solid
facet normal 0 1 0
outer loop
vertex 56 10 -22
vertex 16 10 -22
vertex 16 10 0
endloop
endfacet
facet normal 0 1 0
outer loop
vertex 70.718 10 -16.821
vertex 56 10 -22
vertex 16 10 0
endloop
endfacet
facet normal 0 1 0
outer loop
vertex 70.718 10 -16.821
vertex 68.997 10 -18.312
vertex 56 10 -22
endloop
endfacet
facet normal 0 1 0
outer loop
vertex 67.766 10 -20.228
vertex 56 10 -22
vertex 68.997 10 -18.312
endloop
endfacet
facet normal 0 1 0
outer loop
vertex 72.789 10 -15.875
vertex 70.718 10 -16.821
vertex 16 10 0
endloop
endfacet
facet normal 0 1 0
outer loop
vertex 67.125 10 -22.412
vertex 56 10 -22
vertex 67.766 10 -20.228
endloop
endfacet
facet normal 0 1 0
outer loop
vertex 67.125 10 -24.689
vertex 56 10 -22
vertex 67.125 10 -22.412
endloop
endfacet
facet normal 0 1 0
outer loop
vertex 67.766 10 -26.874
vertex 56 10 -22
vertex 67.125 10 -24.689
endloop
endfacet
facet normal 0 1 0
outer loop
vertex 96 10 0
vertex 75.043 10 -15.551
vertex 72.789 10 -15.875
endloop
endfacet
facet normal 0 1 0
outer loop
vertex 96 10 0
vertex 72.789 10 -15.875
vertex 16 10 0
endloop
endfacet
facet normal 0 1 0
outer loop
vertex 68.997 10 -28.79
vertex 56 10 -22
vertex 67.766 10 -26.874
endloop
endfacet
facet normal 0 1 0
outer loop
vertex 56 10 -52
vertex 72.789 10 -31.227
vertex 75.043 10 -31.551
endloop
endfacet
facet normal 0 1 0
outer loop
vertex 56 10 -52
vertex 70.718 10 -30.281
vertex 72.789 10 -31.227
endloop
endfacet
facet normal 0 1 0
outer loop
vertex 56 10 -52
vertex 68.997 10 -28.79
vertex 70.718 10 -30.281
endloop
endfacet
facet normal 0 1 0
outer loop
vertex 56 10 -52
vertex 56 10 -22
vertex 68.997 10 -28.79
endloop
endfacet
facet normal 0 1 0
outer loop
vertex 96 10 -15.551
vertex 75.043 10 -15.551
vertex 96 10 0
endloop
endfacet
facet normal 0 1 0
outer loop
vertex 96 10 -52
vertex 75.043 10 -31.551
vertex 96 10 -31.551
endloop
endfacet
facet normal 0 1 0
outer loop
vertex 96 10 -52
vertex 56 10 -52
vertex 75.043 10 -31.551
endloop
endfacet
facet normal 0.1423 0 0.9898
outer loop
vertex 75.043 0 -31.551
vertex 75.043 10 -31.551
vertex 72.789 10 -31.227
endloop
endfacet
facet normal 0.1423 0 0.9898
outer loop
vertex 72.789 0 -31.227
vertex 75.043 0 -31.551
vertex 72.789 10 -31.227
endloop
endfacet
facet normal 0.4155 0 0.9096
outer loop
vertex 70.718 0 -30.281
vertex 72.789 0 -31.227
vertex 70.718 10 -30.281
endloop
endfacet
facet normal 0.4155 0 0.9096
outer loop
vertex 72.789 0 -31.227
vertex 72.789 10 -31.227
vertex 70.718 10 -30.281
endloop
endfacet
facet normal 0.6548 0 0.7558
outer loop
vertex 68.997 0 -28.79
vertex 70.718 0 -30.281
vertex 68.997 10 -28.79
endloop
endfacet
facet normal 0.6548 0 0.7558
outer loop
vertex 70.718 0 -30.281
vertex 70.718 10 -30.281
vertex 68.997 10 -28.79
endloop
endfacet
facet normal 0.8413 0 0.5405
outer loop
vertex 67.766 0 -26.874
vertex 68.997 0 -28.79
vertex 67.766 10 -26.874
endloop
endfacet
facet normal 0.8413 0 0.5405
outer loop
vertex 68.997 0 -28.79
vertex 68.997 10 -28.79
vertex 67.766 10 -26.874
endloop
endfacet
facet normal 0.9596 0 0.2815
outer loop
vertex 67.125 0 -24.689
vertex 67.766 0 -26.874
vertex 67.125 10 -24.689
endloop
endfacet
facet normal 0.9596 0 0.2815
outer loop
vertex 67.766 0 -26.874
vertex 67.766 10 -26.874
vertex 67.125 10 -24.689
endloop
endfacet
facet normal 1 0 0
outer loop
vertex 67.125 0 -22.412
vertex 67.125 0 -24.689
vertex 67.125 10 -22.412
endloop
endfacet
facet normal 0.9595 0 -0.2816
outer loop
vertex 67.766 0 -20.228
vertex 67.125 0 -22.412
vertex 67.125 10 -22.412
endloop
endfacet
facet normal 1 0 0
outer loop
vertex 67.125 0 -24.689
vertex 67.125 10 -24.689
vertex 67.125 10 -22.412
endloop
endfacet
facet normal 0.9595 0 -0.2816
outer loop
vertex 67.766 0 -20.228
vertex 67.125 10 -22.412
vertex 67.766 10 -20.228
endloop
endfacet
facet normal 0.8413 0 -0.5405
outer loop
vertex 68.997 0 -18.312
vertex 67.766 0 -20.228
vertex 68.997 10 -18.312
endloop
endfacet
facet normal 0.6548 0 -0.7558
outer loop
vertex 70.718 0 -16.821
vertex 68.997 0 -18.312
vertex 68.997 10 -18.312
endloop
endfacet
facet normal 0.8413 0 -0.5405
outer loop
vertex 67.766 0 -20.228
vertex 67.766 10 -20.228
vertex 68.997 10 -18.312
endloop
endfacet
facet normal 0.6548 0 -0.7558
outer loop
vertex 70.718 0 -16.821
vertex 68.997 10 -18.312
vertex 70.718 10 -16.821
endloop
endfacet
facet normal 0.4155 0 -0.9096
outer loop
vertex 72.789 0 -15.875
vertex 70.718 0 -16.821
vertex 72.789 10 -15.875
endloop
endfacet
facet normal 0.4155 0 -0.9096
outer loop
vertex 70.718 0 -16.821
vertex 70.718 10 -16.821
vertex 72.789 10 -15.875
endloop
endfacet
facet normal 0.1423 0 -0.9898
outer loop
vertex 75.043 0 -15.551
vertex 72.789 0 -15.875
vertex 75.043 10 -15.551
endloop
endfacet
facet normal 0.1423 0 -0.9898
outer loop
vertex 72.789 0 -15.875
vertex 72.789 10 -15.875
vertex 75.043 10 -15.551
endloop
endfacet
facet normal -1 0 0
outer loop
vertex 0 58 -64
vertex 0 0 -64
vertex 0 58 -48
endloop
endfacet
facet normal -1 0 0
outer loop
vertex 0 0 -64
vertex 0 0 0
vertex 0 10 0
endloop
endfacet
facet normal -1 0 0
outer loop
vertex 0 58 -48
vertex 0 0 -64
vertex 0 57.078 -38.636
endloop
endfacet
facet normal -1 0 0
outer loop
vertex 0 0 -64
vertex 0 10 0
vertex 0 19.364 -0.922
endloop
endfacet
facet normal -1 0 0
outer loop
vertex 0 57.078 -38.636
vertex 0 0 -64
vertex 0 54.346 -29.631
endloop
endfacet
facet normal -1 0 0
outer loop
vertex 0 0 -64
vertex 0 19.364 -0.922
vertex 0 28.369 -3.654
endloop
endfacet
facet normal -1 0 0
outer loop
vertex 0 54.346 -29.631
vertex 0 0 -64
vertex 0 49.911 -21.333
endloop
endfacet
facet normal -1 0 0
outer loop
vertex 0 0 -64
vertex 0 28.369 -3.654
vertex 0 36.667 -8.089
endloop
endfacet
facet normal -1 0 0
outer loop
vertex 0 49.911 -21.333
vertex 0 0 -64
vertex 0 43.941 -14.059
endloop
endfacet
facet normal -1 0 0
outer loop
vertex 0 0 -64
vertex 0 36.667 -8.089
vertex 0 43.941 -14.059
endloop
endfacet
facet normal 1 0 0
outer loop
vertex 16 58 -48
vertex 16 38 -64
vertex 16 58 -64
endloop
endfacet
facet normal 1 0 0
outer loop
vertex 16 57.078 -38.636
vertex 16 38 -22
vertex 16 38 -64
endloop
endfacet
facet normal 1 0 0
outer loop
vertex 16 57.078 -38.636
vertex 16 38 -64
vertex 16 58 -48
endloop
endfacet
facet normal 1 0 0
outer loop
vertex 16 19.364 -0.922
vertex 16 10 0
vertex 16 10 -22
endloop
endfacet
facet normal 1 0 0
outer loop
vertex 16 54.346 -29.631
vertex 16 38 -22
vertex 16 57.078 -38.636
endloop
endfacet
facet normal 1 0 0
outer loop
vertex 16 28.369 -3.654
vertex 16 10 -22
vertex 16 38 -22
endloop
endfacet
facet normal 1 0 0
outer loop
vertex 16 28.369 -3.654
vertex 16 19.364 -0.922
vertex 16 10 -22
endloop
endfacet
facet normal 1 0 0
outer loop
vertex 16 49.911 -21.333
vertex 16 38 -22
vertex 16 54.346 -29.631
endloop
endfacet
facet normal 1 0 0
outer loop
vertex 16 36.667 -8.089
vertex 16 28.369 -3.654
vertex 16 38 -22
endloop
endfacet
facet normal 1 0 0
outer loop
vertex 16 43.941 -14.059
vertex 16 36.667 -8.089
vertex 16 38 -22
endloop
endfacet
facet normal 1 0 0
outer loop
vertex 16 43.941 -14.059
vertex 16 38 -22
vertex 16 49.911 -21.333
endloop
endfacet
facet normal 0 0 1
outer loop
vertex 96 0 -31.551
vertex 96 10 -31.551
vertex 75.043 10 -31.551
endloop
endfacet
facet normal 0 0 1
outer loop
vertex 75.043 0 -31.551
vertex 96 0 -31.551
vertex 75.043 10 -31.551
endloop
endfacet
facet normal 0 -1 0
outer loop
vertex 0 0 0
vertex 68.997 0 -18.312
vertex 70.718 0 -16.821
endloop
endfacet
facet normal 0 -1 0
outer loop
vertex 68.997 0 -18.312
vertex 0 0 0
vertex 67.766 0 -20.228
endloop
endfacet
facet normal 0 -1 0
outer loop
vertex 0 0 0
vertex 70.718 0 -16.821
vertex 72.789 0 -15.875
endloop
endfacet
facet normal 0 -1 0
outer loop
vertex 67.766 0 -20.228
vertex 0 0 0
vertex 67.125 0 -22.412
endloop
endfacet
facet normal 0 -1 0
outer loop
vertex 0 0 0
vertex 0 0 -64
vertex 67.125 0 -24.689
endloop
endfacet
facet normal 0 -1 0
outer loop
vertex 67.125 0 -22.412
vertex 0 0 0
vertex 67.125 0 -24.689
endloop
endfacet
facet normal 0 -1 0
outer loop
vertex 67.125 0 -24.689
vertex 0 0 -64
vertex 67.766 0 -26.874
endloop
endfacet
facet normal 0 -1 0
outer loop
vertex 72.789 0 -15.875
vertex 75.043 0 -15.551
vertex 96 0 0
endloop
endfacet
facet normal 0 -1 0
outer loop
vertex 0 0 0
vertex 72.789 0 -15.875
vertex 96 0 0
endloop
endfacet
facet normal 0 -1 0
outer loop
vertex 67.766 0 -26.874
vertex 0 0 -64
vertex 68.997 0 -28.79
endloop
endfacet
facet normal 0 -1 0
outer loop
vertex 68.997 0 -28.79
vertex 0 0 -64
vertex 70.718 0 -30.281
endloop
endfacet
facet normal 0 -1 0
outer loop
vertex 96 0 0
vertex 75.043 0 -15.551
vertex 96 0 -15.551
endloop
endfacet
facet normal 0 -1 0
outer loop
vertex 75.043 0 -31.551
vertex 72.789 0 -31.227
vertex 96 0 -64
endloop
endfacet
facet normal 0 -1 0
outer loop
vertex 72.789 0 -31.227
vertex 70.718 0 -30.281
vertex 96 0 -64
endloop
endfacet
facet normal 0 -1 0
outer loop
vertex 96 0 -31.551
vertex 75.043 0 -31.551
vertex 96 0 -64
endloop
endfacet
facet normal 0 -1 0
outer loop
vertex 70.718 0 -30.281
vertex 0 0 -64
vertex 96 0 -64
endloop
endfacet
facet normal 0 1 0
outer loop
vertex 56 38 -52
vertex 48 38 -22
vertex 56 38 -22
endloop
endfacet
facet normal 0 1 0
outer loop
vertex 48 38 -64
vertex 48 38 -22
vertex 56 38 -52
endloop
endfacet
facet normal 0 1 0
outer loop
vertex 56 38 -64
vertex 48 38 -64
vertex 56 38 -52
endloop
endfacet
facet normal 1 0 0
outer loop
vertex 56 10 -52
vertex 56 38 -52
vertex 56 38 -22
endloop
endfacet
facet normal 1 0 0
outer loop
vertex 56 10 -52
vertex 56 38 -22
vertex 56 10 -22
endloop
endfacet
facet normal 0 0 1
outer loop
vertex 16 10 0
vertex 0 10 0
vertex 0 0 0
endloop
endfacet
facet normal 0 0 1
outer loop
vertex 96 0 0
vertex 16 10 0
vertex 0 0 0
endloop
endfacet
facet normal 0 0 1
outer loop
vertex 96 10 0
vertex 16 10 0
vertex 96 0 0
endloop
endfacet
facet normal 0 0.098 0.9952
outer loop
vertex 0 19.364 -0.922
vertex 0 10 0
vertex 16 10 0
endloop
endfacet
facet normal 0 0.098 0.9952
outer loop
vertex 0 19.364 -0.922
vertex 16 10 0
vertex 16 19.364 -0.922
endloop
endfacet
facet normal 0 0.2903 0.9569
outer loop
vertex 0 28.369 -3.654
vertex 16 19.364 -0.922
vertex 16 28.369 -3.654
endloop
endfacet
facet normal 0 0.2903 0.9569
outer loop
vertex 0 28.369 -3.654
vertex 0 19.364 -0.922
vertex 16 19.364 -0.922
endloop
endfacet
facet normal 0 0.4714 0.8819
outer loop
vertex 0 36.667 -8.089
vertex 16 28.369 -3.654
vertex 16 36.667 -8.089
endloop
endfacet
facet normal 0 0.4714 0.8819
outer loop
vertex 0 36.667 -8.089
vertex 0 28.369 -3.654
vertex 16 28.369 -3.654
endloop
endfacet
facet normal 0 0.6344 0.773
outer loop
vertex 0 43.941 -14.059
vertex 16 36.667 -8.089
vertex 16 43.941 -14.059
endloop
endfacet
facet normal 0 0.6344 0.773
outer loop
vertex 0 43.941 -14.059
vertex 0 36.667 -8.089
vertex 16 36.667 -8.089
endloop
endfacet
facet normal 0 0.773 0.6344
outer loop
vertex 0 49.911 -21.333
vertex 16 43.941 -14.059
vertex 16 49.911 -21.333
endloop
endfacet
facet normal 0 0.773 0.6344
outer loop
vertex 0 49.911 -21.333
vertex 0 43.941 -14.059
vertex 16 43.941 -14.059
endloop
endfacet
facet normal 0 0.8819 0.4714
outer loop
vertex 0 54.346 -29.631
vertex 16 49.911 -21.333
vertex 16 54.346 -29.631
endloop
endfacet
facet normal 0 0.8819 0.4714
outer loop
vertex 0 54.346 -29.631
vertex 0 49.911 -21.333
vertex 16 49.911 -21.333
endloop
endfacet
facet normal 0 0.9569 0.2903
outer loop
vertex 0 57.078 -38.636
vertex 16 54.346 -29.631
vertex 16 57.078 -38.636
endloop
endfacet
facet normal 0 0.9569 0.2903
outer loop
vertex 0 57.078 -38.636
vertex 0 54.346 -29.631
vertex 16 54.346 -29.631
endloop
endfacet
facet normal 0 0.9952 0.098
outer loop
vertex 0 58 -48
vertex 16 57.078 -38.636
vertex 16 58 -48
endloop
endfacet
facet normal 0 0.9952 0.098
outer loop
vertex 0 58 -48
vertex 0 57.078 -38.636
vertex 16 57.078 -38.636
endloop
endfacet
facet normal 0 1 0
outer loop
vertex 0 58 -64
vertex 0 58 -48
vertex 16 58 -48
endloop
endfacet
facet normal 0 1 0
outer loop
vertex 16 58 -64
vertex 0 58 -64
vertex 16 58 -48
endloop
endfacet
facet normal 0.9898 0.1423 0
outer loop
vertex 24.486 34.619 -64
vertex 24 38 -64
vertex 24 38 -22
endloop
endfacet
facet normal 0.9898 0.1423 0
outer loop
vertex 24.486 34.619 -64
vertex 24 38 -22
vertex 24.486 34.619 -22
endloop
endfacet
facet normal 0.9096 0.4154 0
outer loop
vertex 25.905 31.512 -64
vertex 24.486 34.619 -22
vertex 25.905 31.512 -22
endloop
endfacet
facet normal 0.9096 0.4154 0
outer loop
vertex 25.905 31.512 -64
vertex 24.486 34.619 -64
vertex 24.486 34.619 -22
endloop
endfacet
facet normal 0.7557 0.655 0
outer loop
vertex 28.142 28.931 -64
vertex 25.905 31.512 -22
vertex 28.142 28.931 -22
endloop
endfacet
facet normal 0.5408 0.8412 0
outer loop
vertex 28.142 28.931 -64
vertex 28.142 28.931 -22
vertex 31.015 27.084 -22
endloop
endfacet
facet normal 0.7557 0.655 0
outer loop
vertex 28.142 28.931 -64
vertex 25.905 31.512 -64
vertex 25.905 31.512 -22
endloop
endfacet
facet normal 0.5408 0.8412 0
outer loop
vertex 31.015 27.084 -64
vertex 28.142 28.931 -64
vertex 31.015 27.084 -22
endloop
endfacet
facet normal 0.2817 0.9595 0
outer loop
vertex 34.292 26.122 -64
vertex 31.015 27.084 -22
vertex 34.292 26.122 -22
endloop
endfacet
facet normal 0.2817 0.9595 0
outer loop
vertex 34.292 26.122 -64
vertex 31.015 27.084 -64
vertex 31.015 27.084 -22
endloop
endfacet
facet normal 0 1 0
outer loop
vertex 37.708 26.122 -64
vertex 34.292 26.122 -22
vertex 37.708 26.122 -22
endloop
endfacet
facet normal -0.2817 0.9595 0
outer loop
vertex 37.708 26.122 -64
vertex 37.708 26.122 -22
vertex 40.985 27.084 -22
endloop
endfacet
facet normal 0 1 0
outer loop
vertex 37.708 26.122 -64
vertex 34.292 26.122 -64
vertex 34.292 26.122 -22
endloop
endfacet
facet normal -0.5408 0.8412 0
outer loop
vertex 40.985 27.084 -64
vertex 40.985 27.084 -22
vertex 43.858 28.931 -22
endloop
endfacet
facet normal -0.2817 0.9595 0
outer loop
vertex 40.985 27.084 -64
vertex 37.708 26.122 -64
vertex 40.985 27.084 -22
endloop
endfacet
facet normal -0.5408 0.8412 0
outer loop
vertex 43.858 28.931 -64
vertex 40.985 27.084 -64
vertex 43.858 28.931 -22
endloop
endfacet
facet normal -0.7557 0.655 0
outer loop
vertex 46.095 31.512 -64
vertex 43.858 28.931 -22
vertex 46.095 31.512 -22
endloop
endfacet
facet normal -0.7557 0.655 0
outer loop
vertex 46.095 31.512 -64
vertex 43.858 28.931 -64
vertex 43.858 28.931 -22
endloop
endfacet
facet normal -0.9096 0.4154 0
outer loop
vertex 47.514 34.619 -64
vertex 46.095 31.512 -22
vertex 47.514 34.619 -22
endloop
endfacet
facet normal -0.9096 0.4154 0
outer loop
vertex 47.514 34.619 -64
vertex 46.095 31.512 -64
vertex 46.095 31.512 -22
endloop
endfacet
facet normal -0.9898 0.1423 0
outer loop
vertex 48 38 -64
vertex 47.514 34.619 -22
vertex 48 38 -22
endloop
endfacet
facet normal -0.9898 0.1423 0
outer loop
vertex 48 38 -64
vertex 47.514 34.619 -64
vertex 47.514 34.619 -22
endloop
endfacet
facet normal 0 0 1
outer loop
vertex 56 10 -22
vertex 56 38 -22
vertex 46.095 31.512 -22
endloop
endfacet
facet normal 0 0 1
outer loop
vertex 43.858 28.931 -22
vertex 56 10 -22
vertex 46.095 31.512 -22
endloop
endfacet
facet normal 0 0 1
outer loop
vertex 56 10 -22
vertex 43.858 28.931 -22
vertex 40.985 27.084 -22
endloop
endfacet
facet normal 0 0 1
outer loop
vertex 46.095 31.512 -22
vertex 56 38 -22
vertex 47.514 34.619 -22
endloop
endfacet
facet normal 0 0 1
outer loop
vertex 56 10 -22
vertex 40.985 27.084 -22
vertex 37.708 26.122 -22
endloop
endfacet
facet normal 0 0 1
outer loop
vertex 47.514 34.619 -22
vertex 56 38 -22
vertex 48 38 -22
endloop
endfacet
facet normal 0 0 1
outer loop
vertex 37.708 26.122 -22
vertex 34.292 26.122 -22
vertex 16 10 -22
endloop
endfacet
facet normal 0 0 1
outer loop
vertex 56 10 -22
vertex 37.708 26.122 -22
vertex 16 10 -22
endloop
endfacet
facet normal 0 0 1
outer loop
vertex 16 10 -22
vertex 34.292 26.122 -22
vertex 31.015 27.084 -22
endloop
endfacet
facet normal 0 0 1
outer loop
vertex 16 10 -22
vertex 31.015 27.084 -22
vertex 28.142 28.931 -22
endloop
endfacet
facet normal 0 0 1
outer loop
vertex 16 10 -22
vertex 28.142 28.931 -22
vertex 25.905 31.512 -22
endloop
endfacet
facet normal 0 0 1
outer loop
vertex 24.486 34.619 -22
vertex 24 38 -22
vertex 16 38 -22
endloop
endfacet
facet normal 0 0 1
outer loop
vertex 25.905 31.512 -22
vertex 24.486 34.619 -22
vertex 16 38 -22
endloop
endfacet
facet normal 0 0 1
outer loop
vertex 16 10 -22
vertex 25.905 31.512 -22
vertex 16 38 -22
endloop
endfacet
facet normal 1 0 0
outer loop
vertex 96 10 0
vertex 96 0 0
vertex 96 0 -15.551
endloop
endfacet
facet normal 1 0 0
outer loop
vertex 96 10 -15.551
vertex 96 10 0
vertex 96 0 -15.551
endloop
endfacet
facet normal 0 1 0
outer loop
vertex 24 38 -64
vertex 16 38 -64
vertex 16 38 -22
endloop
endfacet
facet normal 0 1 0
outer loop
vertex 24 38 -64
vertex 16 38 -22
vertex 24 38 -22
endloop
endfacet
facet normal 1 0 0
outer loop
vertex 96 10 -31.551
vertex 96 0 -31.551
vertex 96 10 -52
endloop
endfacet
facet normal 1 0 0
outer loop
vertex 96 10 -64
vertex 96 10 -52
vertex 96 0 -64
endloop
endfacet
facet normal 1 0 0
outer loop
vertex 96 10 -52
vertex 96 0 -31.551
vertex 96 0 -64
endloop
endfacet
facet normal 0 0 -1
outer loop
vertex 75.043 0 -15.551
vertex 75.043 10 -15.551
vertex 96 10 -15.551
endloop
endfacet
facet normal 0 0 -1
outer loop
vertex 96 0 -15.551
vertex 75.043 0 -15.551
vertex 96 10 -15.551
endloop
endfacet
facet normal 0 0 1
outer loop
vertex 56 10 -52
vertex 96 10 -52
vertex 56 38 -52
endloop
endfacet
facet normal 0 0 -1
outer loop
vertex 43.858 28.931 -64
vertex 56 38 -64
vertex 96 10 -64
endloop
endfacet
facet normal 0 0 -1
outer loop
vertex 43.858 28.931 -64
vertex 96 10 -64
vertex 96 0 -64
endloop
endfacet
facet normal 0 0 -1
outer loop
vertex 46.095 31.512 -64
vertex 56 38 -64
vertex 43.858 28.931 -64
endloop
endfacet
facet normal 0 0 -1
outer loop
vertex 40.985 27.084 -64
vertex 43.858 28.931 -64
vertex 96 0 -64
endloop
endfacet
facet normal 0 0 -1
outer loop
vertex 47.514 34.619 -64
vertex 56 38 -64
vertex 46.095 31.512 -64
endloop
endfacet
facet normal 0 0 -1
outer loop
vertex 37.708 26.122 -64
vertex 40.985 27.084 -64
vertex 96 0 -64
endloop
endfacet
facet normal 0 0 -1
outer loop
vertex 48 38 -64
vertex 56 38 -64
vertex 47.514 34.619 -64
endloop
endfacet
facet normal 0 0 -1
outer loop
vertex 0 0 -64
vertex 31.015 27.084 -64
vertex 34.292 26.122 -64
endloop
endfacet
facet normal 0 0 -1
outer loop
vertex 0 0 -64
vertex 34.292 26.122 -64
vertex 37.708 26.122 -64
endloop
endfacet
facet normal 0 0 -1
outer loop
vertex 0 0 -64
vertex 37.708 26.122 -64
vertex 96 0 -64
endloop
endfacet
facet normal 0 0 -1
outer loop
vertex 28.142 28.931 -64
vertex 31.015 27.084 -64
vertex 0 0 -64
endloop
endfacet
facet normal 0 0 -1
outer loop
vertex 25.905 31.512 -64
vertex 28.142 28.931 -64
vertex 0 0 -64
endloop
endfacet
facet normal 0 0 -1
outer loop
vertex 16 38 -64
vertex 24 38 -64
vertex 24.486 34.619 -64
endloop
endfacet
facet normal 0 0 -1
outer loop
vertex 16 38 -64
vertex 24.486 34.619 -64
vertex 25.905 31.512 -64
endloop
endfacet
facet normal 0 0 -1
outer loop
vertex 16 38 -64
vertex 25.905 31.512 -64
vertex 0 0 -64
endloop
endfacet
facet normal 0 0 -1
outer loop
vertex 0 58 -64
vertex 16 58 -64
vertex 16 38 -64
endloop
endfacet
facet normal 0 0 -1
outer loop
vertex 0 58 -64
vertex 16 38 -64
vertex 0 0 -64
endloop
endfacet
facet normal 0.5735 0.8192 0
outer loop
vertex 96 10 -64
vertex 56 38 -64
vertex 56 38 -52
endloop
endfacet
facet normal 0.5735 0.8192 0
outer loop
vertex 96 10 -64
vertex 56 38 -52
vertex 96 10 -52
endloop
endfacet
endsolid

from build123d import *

# Parameters (mm, degrees)
SKETCH3_W                      = 96
SKETCH3_H                      = 64
BOSS_EXTRUDE1_DEPTH            = 10
CUT_EXTRUDE1_DEPTH             = 10
SKETCH5_W                      = 16
SKETCH5_H                      = 48
BOSS_EXTRUDE2_DEPTH            = 64
CUT_EXTRUDE5_REACH             = 131.136
CUT_EXTRUDE5_DIRECTION_2_DEPTH = 130.135587659
BOSS_EXTRUDE3_START            = -64
BOSS_EXTRUDE3_DEPTH            = 42
BOSS_EXTRUDE4_DEPTH            = 12


with BuildPart() as part:
    # Sketch3 → Boss-Extrude1 (new body)
    with BuildSketch(Plane(origin=(0, 0, 0), x_dir=(1, 0, 0), z_dir=(0, 1, 0))):
        with Locations((48, 32)):
            Rectangle(SKETCH3_W, SKETCH3_H)
    extrude(amount=BOSS_EXTRUDE1_DEPTH)

    # Sketch4 → Cut-Extrude1 (cut)
    with BuildSketch(Plane(origin=(0, 10, 0), x_dir=(1, 0, 0), z_dir=(0, 1, 0))):
        with BuildLine():
            Line((96, 15.550922522), (96, 31.550922522))
            Line((96, 31.550922522), (75.043299742, 31.550922522))
            ThreePointArc((75.043299742, 31.550922522), (67.043299742, 23.550922522), (75.043299742, 15.550922522))
            Line((75.043299742, 15.550922522), (96, 15.550922522))
        make_face()
    extrude(amount=-CUT_EXTRUDE1_DEPTH, mode=Mode.SUBTRACT)

    # Sketch5 → Boss-Extrude2 (add, through all)
    with BuildSketch(Plane.XY):
        with Locations((8, 34)):
            Rectangle(SKETCH5_W, SKETCH5_H)
    extrude(amount=-BOSS_EXTRUDE2_DEPTH)

    # Sketch6 → Cut-Extrude5 (cut, up to next)
    with BuildSketch(Plane(origin=(0, 0, 0), x_dir=(0, 0, -1), z_dir=(1, 0, 0)), mode=Mode.PRIVATE) as cut_extrude5_sk1:
        with BuildLine():
            Line((0, 58), (0, 10))
            ThreePointArc((0, 10), (14.058874503, 43.941125497), (48, 58))
            Line((48, 58), (0, 58))
        make_face()
    cut_extrude5_tool1 = extrude(cut_extrude5_sk1.sketch, amount=CUT_EXTRUDE5_REACH, mode=Mode.PRIVATE) & part.part
    add(cut_extrude5_tool1.solids().sort_by_distance((0, 47.278339, -10.721661))[0], mode=Mode.SUBTRACT)

    # Sketch6 → Cut-Extrude5 direction 2 (cut)
    with BuildSketch(Plane(origin=(0, 0, 0), x_dir=(0, 0, -1), z_dir=(1, 0, 0))):
        with BuildLine():
            Line((0, 58), (0, 10))
            ThreePointArc((0, 10), (14.058874503, 43.941125497), (48, 58))
            Line((48, 58), (0, 58))
        make_face()
    extrude(amount=-CUT_EXTRUDE5_DIRECTION_2_DEPTH, mode=Mode.SUBTRACT)

    # Sketch8 → Boss-Extrude3 (add)
    with BuildSketch(Plane.XY.offset(BOSS_EXTRUDE3_START)):
        with BuildLine():
            Line((16, 10), (16, 38))
            Line((16, 38), (24, 38))
            ThreePointArc((24, 38), (36, 26), (48, 38))
            Line((48, 38), (56, 38))
            Line((56, 38), (56, 10))
            Line((56, 10), (16, 10))
        make_face()
    extrude(amount=BOSS_EXTRUDE3_DEPTH)

    # Sketch10 → Boss-Extrude4 (add)
    with BuildSketch(Plane(origin=(0, 0, -64), x_dir=(-1, 0, 0), z_dir=(0, 0, -1))):
        Polygon((-56, 38), (-96, 10), (-56, 10), align=None)
    extrude(amount=-BOSS_EXTRUDE4_DEPTH)


solid = part.part
